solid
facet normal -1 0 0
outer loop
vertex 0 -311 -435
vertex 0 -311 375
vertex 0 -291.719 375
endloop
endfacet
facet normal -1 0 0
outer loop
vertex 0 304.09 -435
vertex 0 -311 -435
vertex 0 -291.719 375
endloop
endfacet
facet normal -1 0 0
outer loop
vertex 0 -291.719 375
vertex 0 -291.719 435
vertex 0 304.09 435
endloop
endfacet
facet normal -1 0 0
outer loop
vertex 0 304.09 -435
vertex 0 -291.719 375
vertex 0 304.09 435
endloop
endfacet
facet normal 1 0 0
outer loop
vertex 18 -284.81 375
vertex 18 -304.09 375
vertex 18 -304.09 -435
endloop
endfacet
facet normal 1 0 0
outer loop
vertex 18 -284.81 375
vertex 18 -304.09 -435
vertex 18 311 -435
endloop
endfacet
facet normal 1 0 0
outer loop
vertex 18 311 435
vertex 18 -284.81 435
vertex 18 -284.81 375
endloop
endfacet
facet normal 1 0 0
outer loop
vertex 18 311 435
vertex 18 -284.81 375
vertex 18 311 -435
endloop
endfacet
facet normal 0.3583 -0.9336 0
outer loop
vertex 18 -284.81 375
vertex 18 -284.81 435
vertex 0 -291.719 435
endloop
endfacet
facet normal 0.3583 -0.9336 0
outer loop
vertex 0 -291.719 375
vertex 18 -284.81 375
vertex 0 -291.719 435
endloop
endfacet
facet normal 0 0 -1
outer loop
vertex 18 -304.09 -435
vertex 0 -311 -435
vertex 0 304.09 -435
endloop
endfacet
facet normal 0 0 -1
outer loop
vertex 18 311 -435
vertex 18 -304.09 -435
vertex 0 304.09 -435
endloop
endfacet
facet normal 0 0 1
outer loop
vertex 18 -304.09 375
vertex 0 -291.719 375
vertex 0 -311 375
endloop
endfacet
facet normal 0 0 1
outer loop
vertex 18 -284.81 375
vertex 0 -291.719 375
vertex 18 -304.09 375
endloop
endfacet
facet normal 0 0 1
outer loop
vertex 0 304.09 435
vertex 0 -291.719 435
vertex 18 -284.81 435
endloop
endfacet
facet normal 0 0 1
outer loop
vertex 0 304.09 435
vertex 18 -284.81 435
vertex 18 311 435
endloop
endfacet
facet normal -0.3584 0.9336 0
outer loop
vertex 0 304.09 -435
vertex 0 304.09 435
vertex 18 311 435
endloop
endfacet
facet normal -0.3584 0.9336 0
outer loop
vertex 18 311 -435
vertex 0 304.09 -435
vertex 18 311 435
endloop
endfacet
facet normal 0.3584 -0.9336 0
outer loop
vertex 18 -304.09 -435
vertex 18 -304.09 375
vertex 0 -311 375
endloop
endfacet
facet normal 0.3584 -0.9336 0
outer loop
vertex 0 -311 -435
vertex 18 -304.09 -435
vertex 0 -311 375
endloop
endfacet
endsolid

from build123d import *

# Parameters (mm, degrees)
F0_W     = 622
F0_H     = 870
F1_DEPTH = 18
F3_DEPTH = 870
F5_DEPTH = 60


with BuildPart() as f1:
    # F0 (on Right) → F1 (new body)
    with BuildSketch(Plane.YZ):
        Rectangle(F0_W, F0_H)
    extrude(amount=F1_DEPTH)

    # F2 (on face) → F3 (cut)
    with BuildSketch(Plane.XY.offset(435)):
        Polygon((0, 304.090447), (18, 311), (0, 311), align=None)
        Polygon((18, -304.090447), (0, -311), (18, -311), align=None)
    extrude(amount=-F3_DEPTH, mode=Mode.SUBTRACT)

    # F4 (on face) → F5 (cut)
    with BuildSketch(Plane.XY.offset(435)):
        Polygon((0, -291.71939), (0, -311), (18, -304.090447), (18, -284.809837), align=None)
    extrude(amount=-F5_DEPTH, mode=Mode.SUBTRACT)


solid = f1.part
